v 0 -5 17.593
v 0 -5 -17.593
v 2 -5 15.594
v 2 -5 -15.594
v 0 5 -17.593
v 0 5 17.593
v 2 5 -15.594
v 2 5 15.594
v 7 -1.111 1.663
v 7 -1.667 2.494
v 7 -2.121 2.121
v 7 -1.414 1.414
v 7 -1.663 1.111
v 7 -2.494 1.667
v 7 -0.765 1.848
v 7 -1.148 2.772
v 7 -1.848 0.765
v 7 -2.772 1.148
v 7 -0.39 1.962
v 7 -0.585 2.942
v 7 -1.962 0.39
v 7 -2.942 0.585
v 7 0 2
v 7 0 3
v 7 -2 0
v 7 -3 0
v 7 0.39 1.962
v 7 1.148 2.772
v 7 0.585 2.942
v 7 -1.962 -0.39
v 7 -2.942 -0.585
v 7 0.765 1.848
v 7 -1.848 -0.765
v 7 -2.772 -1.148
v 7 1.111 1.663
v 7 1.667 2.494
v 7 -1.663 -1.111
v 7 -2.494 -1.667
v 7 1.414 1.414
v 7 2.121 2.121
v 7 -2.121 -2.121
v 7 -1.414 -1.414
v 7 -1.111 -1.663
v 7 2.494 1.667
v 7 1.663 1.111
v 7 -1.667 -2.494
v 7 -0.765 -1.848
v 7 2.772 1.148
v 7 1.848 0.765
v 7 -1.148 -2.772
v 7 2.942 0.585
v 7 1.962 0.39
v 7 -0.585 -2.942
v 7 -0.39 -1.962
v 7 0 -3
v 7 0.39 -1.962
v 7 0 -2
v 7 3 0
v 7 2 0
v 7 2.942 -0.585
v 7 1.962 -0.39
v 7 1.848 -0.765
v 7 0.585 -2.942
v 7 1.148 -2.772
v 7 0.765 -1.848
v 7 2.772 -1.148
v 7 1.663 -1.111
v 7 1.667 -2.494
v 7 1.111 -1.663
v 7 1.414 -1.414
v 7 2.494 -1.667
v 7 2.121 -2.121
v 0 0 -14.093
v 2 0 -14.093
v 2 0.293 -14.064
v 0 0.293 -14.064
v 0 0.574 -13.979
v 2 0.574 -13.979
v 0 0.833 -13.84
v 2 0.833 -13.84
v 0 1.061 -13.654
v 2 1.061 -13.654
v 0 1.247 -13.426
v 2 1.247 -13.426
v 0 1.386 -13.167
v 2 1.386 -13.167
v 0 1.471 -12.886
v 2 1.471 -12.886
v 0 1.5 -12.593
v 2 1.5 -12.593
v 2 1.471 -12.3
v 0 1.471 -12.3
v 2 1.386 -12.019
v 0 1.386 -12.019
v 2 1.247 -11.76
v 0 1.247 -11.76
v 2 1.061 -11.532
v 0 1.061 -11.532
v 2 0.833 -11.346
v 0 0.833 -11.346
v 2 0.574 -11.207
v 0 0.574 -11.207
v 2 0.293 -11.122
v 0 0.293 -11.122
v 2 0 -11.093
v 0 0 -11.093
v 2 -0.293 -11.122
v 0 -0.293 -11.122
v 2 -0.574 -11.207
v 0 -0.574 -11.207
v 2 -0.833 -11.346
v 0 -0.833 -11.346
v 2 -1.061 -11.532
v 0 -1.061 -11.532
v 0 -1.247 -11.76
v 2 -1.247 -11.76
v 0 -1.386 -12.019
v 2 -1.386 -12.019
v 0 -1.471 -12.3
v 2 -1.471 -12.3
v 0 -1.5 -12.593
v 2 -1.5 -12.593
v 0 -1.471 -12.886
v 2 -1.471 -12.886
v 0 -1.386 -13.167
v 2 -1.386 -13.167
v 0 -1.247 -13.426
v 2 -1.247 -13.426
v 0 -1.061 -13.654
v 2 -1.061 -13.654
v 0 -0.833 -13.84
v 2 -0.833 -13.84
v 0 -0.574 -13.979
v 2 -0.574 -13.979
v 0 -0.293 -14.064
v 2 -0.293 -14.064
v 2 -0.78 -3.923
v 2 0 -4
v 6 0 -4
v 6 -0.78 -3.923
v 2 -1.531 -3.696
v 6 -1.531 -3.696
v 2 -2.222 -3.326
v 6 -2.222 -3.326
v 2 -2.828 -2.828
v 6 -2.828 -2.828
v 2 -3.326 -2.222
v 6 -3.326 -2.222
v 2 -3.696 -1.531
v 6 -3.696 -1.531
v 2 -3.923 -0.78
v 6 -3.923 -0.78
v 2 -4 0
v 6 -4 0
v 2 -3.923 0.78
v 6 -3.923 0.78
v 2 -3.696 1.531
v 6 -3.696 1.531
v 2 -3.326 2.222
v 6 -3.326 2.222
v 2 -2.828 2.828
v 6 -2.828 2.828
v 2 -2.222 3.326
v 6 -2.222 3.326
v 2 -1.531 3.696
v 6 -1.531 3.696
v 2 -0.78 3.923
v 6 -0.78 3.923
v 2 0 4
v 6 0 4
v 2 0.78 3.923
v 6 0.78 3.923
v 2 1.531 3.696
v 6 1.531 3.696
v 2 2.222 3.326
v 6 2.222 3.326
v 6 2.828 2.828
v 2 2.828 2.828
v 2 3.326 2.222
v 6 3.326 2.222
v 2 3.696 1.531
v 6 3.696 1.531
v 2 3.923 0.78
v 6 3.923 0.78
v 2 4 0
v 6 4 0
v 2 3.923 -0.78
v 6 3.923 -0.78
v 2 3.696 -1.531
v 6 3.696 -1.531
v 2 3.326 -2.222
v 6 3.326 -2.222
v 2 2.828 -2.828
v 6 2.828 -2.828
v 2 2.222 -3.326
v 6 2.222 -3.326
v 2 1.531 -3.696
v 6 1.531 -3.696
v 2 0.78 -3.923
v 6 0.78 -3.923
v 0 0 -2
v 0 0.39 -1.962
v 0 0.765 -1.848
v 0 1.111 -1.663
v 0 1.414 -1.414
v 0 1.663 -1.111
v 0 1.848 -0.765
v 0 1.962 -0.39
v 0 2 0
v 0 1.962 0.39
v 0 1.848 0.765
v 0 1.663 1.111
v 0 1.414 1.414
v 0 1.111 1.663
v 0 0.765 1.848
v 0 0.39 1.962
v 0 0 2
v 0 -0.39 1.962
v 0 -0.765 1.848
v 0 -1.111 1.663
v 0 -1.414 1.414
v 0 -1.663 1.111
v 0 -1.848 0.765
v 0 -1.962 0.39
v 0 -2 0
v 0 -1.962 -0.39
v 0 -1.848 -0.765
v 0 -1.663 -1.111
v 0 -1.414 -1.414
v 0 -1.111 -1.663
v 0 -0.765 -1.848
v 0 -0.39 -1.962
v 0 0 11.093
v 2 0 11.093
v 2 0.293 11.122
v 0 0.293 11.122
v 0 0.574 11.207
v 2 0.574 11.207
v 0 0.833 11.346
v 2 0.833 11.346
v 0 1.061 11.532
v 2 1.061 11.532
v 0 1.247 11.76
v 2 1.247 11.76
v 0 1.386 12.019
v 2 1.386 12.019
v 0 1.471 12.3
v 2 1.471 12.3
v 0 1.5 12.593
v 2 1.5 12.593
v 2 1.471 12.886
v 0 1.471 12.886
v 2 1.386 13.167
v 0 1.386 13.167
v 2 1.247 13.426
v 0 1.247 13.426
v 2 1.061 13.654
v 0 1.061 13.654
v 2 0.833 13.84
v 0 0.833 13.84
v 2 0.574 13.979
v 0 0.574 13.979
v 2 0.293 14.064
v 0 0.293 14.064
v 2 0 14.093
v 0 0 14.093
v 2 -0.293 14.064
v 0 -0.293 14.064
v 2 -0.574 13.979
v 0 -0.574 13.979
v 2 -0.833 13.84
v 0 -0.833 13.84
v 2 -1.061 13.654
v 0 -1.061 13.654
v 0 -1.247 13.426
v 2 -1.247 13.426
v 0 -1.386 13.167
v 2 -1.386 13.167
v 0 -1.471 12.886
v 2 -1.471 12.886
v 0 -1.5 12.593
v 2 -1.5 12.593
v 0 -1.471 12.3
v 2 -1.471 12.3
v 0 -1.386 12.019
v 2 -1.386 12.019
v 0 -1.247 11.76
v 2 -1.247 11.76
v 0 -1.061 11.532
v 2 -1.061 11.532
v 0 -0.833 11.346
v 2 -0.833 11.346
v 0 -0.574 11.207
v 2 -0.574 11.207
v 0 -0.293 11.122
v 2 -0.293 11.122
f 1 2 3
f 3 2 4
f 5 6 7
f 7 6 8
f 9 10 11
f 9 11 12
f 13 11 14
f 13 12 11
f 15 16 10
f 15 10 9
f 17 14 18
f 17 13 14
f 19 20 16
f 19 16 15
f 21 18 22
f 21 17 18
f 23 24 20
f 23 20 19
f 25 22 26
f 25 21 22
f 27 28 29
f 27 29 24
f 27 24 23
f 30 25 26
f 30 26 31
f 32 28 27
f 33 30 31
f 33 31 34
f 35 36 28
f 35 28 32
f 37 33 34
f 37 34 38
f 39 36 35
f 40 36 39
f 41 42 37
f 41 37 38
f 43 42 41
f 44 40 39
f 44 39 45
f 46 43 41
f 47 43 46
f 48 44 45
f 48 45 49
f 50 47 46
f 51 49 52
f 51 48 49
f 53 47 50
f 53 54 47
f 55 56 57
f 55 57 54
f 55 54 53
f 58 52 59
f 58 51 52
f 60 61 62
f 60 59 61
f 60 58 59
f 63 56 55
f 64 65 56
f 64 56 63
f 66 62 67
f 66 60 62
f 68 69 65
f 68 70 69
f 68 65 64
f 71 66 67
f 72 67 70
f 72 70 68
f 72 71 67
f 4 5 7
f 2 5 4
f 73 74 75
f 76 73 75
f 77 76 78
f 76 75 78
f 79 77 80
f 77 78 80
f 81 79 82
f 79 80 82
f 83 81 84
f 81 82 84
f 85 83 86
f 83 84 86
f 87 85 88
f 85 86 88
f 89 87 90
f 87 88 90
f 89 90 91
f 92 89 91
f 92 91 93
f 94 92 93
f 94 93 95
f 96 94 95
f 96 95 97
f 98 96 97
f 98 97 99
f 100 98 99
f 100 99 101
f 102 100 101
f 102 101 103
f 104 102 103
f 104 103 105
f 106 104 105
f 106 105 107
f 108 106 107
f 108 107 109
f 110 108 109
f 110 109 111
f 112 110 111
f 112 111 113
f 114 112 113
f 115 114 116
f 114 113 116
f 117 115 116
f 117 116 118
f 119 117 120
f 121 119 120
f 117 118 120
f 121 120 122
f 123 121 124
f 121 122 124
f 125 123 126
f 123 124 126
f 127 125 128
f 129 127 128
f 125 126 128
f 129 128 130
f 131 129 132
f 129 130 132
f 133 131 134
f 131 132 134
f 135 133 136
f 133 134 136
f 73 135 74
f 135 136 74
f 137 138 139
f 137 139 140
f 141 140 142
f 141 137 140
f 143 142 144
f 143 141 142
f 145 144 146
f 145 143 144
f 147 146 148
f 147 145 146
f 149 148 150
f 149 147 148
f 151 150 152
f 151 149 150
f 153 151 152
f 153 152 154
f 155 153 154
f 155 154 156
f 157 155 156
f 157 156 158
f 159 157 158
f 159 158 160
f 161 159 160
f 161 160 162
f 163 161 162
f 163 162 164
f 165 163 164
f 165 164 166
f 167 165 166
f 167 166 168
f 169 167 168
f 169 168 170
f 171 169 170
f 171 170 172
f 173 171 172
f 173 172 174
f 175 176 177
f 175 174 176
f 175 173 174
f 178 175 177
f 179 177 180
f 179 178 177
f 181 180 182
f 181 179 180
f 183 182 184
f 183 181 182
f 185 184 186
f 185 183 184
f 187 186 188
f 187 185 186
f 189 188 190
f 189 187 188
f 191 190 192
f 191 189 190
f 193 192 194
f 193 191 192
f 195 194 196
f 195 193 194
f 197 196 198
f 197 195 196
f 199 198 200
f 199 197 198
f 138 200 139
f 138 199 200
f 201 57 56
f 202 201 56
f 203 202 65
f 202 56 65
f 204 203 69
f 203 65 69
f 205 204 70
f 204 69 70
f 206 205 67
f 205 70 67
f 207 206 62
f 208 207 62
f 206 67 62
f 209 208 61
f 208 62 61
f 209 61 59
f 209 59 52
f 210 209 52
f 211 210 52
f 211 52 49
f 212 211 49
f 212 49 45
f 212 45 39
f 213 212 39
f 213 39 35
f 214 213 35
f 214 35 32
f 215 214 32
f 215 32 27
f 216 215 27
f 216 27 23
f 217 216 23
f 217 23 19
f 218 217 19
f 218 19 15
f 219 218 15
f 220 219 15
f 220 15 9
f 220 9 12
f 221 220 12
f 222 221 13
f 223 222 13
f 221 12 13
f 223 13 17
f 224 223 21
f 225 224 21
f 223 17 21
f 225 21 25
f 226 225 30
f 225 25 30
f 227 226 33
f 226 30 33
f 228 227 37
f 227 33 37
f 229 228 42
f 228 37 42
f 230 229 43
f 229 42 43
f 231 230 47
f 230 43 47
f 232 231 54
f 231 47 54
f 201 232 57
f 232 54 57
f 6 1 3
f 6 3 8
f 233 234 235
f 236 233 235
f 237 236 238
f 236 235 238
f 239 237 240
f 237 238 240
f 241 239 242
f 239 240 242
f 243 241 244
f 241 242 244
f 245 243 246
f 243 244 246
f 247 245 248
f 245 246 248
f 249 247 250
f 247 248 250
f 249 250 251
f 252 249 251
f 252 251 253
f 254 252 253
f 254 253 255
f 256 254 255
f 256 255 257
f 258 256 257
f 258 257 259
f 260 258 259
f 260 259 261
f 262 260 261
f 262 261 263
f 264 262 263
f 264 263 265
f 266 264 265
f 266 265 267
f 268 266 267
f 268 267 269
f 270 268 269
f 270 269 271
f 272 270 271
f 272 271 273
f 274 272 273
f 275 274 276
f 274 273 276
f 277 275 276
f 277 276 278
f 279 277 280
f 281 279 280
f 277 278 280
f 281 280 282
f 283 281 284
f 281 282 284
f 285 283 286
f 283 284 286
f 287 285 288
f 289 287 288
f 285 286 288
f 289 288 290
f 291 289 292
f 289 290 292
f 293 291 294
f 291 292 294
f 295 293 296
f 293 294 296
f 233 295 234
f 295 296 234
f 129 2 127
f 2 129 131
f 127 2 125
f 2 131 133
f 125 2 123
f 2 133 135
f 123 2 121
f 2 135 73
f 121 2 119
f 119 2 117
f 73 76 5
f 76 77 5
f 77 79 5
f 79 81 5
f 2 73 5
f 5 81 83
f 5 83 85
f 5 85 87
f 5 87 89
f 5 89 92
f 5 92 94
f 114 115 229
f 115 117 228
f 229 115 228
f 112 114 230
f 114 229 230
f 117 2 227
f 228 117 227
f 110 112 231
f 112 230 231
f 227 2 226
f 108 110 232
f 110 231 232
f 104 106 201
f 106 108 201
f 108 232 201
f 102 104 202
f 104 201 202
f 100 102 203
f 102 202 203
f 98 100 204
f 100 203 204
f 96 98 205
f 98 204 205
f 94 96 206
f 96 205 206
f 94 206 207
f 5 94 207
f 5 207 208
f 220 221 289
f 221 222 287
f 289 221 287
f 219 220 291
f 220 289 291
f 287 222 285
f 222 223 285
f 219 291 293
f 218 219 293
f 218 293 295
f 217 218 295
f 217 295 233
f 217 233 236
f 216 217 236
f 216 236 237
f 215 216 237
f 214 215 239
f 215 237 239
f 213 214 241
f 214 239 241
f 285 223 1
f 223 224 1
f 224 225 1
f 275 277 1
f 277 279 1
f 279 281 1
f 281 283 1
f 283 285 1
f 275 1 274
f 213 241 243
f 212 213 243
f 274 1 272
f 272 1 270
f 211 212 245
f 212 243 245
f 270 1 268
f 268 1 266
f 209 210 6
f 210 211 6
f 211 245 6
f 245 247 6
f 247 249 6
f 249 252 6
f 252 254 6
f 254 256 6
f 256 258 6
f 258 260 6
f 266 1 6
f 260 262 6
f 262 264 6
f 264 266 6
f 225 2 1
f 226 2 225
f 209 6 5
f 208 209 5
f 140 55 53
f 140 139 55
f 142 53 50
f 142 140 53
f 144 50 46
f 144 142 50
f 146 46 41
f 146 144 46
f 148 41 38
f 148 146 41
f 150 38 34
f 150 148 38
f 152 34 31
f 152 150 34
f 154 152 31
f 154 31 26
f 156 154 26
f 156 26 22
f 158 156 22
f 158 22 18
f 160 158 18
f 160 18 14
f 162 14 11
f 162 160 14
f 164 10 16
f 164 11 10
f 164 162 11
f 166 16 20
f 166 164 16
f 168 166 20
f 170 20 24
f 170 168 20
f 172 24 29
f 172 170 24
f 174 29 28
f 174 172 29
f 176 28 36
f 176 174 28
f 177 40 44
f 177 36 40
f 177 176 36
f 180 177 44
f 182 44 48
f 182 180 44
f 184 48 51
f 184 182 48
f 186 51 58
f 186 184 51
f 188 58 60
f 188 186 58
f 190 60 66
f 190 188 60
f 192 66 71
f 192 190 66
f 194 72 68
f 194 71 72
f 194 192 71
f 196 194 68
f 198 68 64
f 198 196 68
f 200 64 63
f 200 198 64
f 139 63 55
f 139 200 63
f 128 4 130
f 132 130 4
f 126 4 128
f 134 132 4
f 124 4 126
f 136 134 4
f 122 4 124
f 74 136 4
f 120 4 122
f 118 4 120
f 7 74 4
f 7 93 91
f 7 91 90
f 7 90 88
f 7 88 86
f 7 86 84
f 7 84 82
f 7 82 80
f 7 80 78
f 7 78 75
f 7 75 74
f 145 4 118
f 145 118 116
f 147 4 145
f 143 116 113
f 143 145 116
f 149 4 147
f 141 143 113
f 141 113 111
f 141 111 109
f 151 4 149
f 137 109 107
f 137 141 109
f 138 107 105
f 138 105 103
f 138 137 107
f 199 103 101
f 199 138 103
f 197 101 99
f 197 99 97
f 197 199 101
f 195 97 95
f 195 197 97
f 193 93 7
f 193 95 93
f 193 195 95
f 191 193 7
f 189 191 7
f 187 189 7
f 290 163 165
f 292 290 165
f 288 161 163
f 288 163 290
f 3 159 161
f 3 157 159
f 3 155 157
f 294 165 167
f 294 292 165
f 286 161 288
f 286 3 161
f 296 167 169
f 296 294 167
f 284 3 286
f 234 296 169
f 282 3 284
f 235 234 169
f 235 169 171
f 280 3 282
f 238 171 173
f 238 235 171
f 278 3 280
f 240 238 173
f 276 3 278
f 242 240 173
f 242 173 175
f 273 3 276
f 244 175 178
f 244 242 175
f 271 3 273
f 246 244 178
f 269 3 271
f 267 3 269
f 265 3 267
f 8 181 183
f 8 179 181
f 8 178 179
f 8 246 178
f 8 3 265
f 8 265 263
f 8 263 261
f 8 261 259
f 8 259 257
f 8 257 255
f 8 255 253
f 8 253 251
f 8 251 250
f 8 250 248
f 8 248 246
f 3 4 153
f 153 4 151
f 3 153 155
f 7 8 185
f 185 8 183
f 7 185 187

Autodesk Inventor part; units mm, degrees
ref_plane "YZ Plane" through (0, 0, 0) normal (1, 0, 0) x (0, 1, 0)
ref_plane "XZ Plane" through (0, 0, 0) normal (0, 1, 0) x (-1, 0, 0)
ref_plane "XY Plane" through (0, 0, 0) normal (0, 0, 1) x (1, 0, 0)
sketch "Sketch1" plane through (0, 0, 0) normal (1, 0, 0) x (0, 1, 0)
  line L0 (5, -17.593) -> (-5, -17.593)
  line L1 (-5, -17.593) -> (-5, 17.593)
  line L2 (-5, 17.593) -> (5, 17.593)
  line L3 (5, 17.593) -> (5, -17.593)
  line L4 (5, -17.593) -> (-5, 17.593) construction
  line L5 (-5, -17.593) -> (5, 17.593) construction
  point P0 (0, 0)
  dimension "d0" = 35.186
  dimension "d2" = 10
extrude "Extrusion1" add sketch "Sketch1" along normal blind 2
sketch "Sketch2" plane through (2, 0, 0) normal (1, 0, 0) x (0, 0, -1)
  circle A0 centre (0, 0) radius 4
  dimension "d5" = 8
extrude "Extrusion2" add sketch "Sketch2" along normal blind 5
sketch "Sketch3" plane through (7, 0, 0) normal (1, 0, 0) x (0, 0, -1)
  circle A0 centre (0, 0) radius 4 projected
  circle A1 centre (0, 0) radius 2
  dimension "d8" = 4
extrude "Extrusion3" cut sketch "Sketch3" against normal blind 7 contours A1
sketch "Sketch4" plane through (2, 0, 0) normal (1, 0, 0) x (0, 0, -1)
  line L0 (-17.593, 5) -> (-12.593, 5)
  line L1 (-12.593, 5) -> (-12.593, 0)
  line L2 (-12.593, 0) -> (-17.593, 0)
  line L3 (-17.593, 0) -> (-17.593, 5)
  line L4 (17.593, 5) -> (12.593, 5)
  line L5 (12.593, 5) -> (12.593, 0)
  line L6 (12.593, 0) -> (17.593, 0)
  line L7 (17.593, 0) -> (17.593, 5)
  circle A0 centre (-12.593, 0) radius 1.5
  circle A1 centre (12.593, 0) radius 1.5
  dimension "d11" = 5
  dimension "d12" = 5
  dimension "d13" = 3
  dimension "d14" = 3
extrude "Extrusion4" cut sketch "Sketch4" against normal blind 2 contours A0 L2 L1 | L1 L2 A0 | A1 L6 L5 | L5 L6 A1
chamfer "Chamfer1" distance 1 angle 45 1 edges at (7, 0, 4)
chamfer "Chamfer2" distance 2 angle 45 2 edges at (2, 0, -17.593) (2, 0, 17.593)
properties part number "paka_packa" material "Iron, Cast"
